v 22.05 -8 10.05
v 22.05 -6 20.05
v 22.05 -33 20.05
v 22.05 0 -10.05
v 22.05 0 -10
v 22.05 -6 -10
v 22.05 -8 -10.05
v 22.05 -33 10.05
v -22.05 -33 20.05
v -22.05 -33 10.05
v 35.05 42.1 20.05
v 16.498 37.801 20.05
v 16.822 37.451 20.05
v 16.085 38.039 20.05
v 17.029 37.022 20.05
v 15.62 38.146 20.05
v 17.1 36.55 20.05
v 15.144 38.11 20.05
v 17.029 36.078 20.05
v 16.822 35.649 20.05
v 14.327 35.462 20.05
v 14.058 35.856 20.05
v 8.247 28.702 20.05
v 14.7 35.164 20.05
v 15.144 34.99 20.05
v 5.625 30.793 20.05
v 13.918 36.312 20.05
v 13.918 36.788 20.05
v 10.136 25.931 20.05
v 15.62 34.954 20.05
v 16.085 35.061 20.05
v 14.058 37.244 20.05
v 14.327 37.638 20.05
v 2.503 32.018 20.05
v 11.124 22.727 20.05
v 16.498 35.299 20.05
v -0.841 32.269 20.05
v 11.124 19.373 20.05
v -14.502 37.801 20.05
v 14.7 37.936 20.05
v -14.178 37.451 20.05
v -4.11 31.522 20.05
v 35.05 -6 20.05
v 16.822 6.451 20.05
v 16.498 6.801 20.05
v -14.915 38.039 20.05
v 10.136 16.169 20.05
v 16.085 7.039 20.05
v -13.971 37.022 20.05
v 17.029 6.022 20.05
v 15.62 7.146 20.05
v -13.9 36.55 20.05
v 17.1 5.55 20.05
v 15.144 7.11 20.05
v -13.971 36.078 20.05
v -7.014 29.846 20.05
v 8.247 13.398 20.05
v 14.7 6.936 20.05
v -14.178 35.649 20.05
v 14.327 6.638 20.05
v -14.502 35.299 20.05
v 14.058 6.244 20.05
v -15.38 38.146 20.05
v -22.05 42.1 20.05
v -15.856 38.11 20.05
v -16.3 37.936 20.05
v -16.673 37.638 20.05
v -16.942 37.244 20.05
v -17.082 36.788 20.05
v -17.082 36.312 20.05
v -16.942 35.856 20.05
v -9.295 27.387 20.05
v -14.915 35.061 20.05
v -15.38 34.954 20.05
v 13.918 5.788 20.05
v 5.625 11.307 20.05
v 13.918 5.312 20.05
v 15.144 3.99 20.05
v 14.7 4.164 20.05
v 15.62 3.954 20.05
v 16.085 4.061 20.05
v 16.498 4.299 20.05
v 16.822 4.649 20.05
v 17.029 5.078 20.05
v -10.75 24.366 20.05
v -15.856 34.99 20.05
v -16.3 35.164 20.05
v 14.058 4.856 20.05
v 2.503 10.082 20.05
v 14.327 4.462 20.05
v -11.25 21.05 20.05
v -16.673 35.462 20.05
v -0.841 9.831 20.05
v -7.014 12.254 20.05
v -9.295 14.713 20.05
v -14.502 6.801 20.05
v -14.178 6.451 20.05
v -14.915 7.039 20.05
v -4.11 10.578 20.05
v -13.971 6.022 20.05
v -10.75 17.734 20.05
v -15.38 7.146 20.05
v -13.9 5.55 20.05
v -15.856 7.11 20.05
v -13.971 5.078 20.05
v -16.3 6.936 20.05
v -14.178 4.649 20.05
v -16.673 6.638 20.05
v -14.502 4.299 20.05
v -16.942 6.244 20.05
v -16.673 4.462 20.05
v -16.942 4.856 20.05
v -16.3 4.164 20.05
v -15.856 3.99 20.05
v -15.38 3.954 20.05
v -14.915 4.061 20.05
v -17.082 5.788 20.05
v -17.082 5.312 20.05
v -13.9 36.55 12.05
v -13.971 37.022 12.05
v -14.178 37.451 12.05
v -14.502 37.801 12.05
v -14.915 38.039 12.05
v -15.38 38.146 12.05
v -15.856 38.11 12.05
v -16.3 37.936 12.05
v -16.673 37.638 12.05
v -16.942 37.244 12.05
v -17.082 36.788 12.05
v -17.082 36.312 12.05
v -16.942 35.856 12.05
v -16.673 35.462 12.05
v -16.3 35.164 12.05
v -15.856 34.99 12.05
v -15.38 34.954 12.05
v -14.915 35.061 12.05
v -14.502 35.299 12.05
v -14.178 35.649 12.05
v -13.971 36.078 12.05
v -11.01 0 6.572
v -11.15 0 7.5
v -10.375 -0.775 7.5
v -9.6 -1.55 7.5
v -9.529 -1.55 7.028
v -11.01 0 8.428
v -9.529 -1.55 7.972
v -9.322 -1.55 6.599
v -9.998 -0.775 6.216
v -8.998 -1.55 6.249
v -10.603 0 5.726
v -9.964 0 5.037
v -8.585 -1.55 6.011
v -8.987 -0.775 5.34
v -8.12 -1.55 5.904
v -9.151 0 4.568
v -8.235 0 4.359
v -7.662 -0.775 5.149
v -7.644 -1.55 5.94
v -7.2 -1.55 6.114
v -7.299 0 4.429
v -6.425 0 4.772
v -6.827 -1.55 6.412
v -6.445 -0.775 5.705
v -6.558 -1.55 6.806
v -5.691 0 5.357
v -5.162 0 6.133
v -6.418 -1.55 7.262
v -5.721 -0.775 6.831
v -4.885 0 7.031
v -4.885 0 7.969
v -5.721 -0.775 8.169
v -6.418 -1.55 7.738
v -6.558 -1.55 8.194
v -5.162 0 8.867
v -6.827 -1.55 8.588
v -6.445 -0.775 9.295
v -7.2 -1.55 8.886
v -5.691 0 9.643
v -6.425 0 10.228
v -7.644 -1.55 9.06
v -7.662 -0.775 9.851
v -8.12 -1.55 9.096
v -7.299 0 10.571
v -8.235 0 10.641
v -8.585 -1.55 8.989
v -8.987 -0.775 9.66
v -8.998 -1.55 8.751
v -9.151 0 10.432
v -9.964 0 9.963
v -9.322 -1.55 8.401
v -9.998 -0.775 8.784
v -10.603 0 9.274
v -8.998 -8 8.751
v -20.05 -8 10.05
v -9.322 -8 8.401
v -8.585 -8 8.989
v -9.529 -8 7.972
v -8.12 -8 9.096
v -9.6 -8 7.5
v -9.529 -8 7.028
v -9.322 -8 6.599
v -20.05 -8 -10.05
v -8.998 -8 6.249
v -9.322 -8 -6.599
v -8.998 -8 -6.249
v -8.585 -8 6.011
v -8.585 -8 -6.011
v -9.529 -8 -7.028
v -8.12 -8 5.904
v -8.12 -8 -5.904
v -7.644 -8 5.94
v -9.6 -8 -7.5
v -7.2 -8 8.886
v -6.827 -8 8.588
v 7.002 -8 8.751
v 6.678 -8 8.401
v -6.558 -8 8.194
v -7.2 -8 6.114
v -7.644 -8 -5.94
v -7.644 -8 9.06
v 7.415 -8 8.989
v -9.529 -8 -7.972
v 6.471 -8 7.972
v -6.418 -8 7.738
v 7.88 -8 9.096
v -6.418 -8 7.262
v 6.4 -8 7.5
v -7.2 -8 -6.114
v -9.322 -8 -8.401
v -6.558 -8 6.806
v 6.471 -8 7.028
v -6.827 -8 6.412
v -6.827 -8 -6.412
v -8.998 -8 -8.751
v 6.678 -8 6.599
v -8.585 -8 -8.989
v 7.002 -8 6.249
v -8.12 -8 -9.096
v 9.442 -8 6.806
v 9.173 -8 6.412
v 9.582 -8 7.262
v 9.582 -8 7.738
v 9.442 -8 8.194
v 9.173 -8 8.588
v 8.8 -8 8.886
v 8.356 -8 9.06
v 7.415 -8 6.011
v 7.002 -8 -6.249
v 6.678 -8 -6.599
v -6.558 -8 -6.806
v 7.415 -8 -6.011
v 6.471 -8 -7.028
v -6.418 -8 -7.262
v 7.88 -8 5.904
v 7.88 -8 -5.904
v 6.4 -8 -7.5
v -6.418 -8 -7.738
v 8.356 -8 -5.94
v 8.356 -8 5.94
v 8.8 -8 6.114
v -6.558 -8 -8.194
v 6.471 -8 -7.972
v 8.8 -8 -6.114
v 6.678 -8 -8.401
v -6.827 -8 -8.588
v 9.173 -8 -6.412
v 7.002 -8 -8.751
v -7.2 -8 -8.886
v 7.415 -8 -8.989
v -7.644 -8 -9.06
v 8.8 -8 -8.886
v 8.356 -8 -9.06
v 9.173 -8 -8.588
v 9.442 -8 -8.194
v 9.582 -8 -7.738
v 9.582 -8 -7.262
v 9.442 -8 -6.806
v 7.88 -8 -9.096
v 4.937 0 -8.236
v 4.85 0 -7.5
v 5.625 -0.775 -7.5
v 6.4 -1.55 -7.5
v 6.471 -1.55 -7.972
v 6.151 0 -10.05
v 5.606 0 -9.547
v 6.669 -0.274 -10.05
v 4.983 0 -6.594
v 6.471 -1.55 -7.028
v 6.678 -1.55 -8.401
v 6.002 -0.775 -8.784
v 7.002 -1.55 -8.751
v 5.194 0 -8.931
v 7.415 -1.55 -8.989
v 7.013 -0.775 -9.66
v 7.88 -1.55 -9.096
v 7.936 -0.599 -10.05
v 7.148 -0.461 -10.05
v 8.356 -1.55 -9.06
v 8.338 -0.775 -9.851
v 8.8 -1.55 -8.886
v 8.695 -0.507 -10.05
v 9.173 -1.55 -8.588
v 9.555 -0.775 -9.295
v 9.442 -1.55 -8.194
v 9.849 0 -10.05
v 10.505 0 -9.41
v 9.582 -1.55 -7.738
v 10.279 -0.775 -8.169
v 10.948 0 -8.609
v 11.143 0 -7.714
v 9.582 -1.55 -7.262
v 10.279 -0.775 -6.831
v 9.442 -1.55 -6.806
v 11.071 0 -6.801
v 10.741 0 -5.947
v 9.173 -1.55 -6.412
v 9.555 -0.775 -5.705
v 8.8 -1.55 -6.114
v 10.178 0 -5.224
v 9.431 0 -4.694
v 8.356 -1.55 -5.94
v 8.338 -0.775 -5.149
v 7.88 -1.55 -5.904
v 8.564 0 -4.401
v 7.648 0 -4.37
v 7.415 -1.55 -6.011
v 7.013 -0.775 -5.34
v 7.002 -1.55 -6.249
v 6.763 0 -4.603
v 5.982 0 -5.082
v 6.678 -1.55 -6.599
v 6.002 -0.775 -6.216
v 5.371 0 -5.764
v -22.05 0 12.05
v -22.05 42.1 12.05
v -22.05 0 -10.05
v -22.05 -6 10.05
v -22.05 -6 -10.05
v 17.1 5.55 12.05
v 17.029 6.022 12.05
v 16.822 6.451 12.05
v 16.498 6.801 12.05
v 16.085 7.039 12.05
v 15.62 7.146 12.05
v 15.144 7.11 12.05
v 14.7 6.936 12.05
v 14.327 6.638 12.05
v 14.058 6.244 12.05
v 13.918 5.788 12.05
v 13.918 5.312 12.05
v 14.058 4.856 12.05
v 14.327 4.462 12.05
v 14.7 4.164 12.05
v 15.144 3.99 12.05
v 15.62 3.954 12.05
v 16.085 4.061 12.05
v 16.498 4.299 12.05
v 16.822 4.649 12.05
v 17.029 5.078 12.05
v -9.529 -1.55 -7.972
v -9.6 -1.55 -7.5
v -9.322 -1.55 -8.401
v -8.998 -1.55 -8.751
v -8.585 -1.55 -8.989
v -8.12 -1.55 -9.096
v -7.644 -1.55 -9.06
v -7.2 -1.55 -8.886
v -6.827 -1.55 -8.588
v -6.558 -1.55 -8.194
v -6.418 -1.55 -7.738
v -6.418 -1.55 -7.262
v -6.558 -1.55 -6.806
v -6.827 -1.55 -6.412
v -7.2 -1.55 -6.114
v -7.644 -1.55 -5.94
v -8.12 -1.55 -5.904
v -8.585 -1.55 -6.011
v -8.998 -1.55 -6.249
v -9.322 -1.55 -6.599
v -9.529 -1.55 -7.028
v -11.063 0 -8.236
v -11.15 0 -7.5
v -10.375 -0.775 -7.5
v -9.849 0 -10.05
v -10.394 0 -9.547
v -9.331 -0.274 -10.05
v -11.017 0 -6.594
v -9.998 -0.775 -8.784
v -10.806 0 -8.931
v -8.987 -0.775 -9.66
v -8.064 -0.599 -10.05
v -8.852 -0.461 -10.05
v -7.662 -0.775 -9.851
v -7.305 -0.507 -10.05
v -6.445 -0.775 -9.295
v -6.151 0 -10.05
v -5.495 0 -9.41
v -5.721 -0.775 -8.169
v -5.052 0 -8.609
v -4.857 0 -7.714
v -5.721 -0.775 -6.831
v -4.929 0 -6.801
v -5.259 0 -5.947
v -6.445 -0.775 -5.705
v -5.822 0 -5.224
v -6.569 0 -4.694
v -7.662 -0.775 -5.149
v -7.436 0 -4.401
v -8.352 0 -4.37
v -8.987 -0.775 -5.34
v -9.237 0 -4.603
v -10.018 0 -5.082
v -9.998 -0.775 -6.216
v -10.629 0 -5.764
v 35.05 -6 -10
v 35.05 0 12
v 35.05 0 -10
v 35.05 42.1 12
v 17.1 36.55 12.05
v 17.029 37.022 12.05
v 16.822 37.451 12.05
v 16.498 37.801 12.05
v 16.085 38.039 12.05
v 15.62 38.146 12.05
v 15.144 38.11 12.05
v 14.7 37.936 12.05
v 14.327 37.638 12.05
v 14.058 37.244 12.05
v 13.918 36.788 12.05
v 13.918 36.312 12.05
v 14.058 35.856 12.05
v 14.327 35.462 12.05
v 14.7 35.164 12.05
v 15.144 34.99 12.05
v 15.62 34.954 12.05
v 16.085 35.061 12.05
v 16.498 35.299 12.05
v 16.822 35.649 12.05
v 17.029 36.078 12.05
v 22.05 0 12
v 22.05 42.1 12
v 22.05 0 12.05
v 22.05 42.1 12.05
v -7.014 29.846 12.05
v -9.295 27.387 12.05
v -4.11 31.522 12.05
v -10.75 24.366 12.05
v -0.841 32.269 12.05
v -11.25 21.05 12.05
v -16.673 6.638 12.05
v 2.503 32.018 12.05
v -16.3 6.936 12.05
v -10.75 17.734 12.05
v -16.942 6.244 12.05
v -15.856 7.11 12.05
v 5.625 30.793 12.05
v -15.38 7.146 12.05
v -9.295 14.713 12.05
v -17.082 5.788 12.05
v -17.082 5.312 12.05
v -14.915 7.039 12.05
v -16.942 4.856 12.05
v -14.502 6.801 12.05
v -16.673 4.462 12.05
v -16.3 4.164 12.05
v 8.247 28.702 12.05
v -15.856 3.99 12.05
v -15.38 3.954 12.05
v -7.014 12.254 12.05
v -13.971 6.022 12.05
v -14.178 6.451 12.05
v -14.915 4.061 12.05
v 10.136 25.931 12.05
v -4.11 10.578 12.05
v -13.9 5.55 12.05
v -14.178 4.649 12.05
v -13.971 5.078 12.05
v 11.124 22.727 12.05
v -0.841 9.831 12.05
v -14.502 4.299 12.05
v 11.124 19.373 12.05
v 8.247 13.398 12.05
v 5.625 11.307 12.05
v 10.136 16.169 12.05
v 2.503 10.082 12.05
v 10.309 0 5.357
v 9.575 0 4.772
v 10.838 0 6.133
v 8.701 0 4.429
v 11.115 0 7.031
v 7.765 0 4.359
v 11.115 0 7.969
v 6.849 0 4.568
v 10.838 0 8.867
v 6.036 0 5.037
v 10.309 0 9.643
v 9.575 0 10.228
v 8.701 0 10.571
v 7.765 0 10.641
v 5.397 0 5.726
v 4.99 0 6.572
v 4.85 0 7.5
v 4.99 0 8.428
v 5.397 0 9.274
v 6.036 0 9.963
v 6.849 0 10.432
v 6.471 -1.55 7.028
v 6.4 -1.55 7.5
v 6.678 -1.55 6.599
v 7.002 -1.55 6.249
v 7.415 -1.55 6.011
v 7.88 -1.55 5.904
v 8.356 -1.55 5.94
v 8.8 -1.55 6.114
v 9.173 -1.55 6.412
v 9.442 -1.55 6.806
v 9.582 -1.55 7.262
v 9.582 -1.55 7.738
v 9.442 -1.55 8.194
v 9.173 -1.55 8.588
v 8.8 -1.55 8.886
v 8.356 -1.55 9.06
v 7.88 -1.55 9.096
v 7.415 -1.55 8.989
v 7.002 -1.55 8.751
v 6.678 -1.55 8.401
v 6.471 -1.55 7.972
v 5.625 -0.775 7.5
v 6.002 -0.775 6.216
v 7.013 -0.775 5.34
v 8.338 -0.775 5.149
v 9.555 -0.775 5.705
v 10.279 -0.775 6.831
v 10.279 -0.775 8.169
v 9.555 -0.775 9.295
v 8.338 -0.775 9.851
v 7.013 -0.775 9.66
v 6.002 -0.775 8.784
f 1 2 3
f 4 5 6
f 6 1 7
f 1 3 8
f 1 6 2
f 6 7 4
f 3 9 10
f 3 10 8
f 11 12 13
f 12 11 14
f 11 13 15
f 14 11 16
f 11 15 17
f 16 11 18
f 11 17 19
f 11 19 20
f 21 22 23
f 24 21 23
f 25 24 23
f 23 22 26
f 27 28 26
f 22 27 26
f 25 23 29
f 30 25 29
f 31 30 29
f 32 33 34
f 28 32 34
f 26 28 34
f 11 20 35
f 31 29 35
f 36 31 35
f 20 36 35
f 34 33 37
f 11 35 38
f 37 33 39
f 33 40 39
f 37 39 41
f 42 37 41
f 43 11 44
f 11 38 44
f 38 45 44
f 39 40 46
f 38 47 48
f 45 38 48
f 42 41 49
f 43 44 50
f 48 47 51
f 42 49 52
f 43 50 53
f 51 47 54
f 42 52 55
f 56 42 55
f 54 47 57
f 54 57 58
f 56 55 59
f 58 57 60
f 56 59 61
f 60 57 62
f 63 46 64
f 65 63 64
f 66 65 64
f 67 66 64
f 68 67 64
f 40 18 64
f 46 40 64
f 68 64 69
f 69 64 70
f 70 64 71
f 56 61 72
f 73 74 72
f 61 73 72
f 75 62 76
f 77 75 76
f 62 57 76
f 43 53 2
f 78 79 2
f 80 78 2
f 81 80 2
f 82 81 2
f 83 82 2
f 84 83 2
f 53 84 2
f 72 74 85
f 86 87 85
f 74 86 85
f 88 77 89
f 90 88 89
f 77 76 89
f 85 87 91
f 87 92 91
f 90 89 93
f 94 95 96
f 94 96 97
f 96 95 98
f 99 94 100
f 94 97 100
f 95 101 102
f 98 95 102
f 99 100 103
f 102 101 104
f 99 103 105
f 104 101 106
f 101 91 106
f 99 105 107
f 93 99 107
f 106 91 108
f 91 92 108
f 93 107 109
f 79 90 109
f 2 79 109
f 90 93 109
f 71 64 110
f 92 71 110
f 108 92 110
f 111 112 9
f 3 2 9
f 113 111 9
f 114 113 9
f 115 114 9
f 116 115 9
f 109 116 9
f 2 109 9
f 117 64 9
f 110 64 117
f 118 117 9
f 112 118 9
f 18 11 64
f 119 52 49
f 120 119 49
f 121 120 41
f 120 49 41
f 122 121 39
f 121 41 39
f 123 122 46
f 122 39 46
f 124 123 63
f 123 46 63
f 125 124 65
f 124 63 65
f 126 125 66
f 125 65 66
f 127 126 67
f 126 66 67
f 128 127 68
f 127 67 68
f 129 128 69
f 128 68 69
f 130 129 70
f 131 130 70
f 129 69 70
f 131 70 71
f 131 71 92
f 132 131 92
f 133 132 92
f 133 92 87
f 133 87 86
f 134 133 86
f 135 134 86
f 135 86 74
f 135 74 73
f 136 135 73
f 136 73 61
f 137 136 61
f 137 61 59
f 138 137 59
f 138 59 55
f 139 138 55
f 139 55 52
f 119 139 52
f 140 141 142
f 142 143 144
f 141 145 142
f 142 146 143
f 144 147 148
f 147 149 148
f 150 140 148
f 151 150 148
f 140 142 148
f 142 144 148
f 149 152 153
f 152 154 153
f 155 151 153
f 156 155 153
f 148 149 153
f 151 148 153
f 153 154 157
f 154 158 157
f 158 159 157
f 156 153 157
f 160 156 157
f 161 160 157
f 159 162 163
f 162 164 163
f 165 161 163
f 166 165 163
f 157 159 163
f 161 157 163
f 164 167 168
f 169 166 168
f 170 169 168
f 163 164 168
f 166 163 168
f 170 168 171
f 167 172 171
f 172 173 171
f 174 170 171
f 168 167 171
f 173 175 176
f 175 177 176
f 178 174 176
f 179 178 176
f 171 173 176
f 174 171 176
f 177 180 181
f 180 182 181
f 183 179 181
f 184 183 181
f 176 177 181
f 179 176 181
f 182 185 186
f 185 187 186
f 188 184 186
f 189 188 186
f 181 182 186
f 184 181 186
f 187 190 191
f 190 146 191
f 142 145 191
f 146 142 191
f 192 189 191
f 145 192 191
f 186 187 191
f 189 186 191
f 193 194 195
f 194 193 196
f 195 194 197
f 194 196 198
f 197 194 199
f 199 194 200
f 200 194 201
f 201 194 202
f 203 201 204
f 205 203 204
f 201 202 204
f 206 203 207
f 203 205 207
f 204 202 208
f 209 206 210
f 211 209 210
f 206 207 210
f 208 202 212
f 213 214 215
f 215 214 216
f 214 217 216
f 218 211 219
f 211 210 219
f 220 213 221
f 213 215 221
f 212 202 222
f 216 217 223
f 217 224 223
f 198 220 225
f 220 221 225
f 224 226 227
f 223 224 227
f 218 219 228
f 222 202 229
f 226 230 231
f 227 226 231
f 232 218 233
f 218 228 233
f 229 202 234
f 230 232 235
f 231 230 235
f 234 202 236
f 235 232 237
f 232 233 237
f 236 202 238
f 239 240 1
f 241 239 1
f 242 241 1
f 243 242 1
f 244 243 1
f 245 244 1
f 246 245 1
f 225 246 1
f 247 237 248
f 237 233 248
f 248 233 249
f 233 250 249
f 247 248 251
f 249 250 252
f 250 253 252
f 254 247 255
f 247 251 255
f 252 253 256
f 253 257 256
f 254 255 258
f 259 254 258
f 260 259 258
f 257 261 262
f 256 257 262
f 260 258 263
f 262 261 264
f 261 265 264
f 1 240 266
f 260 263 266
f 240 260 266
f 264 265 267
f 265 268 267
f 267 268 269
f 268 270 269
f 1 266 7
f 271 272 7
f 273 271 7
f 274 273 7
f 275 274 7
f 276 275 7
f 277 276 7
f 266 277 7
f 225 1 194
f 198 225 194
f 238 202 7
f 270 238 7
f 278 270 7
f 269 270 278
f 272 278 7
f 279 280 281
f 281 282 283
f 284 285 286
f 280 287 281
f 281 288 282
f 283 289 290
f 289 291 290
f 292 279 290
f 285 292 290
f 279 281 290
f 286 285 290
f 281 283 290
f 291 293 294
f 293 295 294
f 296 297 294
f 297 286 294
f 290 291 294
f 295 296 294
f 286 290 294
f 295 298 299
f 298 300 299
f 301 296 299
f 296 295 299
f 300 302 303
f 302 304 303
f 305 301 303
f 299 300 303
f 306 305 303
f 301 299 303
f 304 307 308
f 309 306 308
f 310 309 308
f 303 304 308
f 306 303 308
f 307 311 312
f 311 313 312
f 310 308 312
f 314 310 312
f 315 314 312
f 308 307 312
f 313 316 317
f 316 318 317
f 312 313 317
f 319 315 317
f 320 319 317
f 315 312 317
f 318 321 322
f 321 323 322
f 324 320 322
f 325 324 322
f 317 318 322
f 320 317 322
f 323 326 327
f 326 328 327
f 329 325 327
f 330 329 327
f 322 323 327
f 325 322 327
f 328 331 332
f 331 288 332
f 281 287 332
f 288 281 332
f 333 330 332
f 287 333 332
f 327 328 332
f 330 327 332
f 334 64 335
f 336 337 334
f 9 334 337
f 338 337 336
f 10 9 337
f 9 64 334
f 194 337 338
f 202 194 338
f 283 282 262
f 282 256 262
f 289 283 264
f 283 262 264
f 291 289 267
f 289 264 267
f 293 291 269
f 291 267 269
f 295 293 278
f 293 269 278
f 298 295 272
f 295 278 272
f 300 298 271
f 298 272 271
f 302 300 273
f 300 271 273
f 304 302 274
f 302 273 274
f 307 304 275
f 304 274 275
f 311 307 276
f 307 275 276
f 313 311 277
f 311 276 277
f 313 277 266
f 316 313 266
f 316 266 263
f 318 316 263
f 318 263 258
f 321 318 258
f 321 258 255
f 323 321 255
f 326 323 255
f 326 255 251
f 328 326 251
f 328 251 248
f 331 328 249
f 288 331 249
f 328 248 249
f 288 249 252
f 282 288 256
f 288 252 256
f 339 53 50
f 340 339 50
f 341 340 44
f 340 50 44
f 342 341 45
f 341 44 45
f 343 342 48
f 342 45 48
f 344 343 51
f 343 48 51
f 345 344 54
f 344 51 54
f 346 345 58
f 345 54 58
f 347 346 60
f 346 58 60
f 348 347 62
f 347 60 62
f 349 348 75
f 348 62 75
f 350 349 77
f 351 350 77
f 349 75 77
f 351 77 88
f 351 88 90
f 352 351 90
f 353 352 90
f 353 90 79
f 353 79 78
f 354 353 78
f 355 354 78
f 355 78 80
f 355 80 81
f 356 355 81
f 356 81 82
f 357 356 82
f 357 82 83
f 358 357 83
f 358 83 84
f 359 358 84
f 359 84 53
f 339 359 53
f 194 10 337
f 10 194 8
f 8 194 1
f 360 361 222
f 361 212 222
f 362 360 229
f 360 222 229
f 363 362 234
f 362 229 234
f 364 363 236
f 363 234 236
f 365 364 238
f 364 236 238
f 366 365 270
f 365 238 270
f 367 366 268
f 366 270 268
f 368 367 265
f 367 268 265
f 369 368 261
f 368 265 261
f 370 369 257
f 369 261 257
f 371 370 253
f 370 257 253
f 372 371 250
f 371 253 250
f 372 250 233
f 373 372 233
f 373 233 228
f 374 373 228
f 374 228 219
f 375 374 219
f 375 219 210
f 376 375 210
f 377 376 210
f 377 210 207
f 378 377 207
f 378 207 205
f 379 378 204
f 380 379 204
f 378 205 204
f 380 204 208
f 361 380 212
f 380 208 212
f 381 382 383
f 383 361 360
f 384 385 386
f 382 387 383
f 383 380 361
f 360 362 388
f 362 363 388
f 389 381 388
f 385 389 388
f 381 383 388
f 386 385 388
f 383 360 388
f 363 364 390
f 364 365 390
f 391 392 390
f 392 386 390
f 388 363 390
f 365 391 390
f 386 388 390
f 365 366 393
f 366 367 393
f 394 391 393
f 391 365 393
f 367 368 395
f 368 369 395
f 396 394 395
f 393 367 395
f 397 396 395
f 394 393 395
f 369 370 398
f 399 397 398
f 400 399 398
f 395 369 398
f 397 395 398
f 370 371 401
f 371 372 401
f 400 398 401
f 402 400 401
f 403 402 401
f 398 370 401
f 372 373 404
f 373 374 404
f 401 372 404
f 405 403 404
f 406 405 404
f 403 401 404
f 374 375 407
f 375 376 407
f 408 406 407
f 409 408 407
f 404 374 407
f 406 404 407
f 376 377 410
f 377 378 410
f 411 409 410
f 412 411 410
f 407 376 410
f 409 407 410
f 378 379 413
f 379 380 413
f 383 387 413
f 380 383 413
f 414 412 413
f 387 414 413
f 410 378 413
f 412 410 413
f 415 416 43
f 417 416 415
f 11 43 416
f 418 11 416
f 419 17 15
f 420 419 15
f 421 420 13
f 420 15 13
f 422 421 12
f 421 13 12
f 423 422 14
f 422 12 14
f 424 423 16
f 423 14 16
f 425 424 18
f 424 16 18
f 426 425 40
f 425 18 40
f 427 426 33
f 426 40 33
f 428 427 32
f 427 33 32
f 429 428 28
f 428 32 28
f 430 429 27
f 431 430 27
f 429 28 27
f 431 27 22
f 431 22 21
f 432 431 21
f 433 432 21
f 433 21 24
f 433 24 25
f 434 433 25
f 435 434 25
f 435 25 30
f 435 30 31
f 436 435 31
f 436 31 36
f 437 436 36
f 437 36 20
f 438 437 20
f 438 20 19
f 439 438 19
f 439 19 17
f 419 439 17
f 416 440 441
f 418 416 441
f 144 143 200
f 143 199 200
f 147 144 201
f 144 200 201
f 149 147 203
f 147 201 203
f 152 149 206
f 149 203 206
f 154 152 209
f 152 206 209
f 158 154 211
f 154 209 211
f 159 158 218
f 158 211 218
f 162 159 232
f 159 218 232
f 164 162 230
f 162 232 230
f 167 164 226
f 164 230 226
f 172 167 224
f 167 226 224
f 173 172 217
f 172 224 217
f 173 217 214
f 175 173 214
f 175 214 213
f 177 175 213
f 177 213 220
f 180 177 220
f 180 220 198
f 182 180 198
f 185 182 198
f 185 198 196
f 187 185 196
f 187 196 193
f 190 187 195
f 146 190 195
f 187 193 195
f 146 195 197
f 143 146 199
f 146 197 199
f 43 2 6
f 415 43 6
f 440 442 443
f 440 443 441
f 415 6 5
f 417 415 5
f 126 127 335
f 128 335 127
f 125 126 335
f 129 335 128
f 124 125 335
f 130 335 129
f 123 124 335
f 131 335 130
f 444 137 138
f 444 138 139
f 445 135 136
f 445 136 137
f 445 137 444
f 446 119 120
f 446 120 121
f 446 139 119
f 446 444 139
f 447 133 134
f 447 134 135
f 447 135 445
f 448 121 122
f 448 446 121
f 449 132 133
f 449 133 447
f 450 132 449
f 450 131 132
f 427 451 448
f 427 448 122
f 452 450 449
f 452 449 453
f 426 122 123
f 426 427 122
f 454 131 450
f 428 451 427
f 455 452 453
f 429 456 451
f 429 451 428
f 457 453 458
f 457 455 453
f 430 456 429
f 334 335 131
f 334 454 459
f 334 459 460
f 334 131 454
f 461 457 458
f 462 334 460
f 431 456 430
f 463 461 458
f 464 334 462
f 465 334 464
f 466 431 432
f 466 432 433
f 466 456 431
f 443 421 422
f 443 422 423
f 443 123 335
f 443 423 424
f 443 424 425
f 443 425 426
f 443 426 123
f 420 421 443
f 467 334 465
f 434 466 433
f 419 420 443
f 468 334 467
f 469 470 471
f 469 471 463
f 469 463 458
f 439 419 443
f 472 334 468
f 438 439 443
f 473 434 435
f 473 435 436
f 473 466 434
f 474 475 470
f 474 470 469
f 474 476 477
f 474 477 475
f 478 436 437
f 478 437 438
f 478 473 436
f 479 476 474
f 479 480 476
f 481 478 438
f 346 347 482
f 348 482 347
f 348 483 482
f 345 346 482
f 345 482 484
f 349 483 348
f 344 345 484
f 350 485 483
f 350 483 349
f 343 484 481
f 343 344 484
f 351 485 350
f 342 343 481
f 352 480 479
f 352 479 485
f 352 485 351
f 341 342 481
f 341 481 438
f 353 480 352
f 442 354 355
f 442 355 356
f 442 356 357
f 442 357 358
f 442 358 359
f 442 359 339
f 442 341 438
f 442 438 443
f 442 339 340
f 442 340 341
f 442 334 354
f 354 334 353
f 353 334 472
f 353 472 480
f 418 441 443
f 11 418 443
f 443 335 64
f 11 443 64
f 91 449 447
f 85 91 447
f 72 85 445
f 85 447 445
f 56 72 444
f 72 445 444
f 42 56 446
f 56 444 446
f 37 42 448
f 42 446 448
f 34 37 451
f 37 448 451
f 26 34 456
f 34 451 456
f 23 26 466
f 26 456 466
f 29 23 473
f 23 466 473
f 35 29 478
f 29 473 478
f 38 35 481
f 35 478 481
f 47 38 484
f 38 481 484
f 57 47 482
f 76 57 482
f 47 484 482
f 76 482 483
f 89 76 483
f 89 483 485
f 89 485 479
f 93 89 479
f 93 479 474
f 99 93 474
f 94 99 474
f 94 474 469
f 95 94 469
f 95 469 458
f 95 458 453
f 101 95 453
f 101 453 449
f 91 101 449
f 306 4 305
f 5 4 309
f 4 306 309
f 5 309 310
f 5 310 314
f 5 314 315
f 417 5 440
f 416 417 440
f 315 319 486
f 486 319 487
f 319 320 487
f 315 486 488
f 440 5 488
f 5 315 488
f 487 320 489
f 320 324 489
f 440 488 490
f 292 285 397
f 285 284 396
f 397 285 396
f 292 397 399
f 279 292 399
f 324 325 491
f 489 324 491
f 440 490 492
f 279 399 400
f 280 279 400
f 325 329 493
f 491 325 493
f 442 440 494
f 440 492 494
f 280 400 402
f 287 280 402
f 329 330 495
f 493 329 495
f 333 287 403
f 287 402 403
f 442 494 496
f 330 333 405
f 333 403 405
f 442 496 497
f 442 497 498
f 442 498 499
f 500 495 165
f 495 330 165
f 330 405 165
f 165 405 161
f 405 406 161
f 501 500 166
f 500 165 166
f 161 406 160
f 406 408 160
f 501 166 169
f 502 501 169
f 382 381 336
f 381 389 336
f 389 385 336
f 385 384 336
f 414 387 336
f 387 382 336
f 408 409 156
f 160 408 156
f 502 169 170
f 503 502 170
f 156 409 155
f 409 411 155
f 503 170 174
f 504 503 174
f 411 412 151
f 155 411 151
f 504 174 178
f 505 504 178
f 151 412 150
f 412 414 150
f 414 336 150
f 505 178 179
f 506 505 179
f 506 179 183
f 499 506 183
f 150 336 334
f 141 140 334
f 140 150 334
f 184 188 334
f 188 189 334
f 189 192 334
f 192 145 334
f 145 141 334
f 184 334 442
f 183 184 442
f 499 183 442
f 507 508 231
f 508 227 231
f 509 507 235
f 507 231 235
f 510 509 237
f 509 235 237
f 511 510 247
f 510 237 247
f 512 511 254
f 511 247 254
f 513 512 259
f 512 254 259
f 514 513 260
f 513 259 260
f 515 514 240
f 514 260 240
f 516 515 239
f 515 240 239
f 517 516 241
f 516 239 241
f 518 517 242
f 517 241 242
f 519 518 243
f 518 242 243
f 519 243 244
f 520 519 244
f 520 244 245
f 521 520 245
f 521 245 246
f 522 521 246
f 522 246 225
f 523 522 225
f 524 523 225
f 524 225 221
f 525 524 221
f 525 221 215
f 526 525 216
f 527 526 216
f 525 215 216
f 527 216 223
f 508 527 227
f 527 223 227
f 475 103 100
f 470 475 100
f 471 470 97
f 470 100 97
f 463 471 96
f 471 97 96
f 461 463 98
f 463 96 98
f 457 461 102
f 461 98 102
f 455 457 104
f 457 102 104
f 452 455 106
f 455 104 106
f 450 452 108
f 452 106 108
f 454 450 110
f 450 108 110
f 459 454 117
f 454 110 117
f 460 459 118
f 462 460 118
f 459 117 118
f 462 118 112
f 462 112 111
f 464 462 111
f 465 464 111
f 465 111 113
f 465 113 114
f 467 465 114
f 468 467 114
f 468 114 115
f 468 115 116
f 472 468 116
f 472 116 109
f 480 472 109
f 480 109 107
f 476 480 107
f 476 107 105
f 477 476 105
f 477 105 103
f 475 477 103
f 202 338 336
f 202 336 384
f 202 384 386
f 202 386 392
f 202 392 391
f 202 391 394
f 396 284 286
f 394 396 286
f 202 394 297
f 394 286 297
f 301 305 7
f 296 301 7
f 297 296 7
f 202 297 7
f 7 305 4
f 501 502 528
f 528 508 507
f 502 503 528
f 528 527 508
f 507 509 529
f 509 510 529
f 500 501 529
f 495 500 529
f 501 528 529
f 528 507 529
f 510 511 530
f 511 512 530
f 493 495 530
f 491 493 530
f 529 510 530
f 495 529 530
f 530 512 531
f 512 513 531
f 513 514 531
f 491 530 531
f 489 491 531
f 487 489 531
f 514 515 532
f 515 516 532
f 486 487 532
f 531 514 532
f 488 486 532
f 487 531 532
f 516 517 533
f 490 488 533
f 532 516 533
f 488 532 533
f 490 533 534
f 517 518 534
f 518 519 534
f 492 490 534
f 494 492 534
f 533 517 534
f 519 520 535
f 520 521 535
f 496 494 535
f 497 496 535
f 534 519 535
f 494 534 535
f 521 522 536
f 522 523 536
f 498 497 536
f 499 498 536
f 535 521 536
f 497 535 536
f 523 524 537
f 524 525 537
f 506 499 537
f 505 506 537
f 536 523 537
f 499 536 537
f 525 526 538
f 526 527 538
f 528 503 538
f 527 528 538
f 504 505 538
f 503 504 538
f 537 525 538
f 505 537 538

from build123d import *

# Parameters (mm, degrees)
SKETCH3_W                                       = 44.1
SKETCH3_H                                       = 30.1
BOSS_EXTRUDE1_DEPTH                             = 8
SKETCH4_W                                       = 44.1
SKETCH4_H                                       = 10
BOSS_EXTRUDE2_DEPTH                             = 25
CSK_FOR_M3_FLAT_HEAD_MACHINE_SCREW1_D           = 3.2
CSK_FOR_M3_FLAT_HEAD_MACHINE_SCREW1_CSINK_D     = 6.3
CSK_FOR_M3_FLAT_HEAD_MACHINE_SCREW1_CSINK_ANGLE = 90
SKETCH10_W                                      = 44.1
SKETCH10_H                                      = 8
BOSS_EXTRUDE3_DEPTH                             = 42.1
SKETCH11_R                                      = 11.25
CUT_EXTRUDE1_DEPTH                              = 42
M3_CLEARANCE_HOLE4_D                            = 3.2
BOSS_EXTRUDE4_DEPTH                             = 13
CHAMFER2_SIZE                                   = 2


with BuildPart() as part:
    # Sketch3 → Boss-Extrude1 (new body)
    with BuildSketch(Plane(origin=(0, 0, 0), x_dir=(1, 0, 0), z_dir=(0, 1, 0))):
        with Locations((0, -5)):
            Rectangle(SKETCH3_W, SKETCH3_H)
    extrude(amount=-BOSS_EXTRUDE1_DEPTH)

    # Sketch4 → Boss-Extrude2 (add)
    with BuildSketch(Plane.XZ.offset(8)):
        with Locations((0, 15.05)):
            Rectangle(SKETCH4_W, SKETCH4_H)
    extrude(amount=BOSS_EXTRUDE2_DEPTH)

    # CSK for M3 Flat Head Machine Screw1 (through all)
    with Locations(Plane(origin=(0, 0, 0), x_dir=(1, 0, 0), z_dir=(0, 1, 0))):
        with Locations((8, -7.5), (-8, -7.5), (8, 7.5), (-8, 7.5)):
            CounterSinkHole(CSK_FOR_M3_FLAT_HEAD_MACHINE_SCREW1_D / 2, CSK_FOR_M3_FLAT_HEAD_MACHINE_SCREW1_CSINK_D / 2, counter_sink_angle=CSK_FOR_M3_FLAT_HEAD_MACHINE_SCREW1_CSINK_ANGLE)

    # Sketch10 → Boss-Extrude3 (add)
    with BuildSketch(Plane(origin=(0, 0, 0), x_dir=(1, 0, 0), z_dir=(0, 1, 0))):
        with Locations((0, -16.05)):
            Rectangle(SKETCH10_W, SKETCH10_H)
    extrude(amount=BOSS_EXTRUDE3_DEPTH)

    # Sketch11 → Cut-Extrude1 (cut)
    with BuildSketch(Plane(origin=(0, 0, 12.05), x_dir=(-1, 0, 0), z_dir=(0, 0, -1))):
        with Locations((0, 21.05)):
            Circle(SKETCH11_R)
    extrude(amount=-CUT_EXTRUDE1_DEPTH, mode=Mode.SUBTRACT)

    # M3 Clearance Hole4 (through all)
    with Locations(Plane(origin=(0, 0, 12.05), x_dir=(-1, 0, 0), z_dir=(0, 0, -1))):
        with Locations((15.5, 5.55), (-15.5, 5.55), (15.5, 36.55), (-15.5, 36.55)):
            Hole(M3_CLEARANCE_HOLE4_D / 2)

    # Sketch14 → Boss-Extrude4 (add)
    with BuildSketch(Plane(origin=(22.05, 0, 0), x_dir=(0, 0, -1), z_dir=(1, 0, 0))):
        Polygon((10, 0), (-10, 0), (-12, 0), (-12, 42.1), (-20.05, 42.1), (-20.05, -6), (-12, -6), (-10, -6), (10, -6), align=None)
    extrude(amount=BOSS_EXTRUDE4_DEPTH)

    # Chamfer2
    chamfer2_edges = [part.edges().sort_by_distance(p)[0] for p in [
        (-22.05, -8, 0),
    ]]
    chamfer(chamfer2_edges, length=CHAMFER2_SIZE)


solid = part.part
